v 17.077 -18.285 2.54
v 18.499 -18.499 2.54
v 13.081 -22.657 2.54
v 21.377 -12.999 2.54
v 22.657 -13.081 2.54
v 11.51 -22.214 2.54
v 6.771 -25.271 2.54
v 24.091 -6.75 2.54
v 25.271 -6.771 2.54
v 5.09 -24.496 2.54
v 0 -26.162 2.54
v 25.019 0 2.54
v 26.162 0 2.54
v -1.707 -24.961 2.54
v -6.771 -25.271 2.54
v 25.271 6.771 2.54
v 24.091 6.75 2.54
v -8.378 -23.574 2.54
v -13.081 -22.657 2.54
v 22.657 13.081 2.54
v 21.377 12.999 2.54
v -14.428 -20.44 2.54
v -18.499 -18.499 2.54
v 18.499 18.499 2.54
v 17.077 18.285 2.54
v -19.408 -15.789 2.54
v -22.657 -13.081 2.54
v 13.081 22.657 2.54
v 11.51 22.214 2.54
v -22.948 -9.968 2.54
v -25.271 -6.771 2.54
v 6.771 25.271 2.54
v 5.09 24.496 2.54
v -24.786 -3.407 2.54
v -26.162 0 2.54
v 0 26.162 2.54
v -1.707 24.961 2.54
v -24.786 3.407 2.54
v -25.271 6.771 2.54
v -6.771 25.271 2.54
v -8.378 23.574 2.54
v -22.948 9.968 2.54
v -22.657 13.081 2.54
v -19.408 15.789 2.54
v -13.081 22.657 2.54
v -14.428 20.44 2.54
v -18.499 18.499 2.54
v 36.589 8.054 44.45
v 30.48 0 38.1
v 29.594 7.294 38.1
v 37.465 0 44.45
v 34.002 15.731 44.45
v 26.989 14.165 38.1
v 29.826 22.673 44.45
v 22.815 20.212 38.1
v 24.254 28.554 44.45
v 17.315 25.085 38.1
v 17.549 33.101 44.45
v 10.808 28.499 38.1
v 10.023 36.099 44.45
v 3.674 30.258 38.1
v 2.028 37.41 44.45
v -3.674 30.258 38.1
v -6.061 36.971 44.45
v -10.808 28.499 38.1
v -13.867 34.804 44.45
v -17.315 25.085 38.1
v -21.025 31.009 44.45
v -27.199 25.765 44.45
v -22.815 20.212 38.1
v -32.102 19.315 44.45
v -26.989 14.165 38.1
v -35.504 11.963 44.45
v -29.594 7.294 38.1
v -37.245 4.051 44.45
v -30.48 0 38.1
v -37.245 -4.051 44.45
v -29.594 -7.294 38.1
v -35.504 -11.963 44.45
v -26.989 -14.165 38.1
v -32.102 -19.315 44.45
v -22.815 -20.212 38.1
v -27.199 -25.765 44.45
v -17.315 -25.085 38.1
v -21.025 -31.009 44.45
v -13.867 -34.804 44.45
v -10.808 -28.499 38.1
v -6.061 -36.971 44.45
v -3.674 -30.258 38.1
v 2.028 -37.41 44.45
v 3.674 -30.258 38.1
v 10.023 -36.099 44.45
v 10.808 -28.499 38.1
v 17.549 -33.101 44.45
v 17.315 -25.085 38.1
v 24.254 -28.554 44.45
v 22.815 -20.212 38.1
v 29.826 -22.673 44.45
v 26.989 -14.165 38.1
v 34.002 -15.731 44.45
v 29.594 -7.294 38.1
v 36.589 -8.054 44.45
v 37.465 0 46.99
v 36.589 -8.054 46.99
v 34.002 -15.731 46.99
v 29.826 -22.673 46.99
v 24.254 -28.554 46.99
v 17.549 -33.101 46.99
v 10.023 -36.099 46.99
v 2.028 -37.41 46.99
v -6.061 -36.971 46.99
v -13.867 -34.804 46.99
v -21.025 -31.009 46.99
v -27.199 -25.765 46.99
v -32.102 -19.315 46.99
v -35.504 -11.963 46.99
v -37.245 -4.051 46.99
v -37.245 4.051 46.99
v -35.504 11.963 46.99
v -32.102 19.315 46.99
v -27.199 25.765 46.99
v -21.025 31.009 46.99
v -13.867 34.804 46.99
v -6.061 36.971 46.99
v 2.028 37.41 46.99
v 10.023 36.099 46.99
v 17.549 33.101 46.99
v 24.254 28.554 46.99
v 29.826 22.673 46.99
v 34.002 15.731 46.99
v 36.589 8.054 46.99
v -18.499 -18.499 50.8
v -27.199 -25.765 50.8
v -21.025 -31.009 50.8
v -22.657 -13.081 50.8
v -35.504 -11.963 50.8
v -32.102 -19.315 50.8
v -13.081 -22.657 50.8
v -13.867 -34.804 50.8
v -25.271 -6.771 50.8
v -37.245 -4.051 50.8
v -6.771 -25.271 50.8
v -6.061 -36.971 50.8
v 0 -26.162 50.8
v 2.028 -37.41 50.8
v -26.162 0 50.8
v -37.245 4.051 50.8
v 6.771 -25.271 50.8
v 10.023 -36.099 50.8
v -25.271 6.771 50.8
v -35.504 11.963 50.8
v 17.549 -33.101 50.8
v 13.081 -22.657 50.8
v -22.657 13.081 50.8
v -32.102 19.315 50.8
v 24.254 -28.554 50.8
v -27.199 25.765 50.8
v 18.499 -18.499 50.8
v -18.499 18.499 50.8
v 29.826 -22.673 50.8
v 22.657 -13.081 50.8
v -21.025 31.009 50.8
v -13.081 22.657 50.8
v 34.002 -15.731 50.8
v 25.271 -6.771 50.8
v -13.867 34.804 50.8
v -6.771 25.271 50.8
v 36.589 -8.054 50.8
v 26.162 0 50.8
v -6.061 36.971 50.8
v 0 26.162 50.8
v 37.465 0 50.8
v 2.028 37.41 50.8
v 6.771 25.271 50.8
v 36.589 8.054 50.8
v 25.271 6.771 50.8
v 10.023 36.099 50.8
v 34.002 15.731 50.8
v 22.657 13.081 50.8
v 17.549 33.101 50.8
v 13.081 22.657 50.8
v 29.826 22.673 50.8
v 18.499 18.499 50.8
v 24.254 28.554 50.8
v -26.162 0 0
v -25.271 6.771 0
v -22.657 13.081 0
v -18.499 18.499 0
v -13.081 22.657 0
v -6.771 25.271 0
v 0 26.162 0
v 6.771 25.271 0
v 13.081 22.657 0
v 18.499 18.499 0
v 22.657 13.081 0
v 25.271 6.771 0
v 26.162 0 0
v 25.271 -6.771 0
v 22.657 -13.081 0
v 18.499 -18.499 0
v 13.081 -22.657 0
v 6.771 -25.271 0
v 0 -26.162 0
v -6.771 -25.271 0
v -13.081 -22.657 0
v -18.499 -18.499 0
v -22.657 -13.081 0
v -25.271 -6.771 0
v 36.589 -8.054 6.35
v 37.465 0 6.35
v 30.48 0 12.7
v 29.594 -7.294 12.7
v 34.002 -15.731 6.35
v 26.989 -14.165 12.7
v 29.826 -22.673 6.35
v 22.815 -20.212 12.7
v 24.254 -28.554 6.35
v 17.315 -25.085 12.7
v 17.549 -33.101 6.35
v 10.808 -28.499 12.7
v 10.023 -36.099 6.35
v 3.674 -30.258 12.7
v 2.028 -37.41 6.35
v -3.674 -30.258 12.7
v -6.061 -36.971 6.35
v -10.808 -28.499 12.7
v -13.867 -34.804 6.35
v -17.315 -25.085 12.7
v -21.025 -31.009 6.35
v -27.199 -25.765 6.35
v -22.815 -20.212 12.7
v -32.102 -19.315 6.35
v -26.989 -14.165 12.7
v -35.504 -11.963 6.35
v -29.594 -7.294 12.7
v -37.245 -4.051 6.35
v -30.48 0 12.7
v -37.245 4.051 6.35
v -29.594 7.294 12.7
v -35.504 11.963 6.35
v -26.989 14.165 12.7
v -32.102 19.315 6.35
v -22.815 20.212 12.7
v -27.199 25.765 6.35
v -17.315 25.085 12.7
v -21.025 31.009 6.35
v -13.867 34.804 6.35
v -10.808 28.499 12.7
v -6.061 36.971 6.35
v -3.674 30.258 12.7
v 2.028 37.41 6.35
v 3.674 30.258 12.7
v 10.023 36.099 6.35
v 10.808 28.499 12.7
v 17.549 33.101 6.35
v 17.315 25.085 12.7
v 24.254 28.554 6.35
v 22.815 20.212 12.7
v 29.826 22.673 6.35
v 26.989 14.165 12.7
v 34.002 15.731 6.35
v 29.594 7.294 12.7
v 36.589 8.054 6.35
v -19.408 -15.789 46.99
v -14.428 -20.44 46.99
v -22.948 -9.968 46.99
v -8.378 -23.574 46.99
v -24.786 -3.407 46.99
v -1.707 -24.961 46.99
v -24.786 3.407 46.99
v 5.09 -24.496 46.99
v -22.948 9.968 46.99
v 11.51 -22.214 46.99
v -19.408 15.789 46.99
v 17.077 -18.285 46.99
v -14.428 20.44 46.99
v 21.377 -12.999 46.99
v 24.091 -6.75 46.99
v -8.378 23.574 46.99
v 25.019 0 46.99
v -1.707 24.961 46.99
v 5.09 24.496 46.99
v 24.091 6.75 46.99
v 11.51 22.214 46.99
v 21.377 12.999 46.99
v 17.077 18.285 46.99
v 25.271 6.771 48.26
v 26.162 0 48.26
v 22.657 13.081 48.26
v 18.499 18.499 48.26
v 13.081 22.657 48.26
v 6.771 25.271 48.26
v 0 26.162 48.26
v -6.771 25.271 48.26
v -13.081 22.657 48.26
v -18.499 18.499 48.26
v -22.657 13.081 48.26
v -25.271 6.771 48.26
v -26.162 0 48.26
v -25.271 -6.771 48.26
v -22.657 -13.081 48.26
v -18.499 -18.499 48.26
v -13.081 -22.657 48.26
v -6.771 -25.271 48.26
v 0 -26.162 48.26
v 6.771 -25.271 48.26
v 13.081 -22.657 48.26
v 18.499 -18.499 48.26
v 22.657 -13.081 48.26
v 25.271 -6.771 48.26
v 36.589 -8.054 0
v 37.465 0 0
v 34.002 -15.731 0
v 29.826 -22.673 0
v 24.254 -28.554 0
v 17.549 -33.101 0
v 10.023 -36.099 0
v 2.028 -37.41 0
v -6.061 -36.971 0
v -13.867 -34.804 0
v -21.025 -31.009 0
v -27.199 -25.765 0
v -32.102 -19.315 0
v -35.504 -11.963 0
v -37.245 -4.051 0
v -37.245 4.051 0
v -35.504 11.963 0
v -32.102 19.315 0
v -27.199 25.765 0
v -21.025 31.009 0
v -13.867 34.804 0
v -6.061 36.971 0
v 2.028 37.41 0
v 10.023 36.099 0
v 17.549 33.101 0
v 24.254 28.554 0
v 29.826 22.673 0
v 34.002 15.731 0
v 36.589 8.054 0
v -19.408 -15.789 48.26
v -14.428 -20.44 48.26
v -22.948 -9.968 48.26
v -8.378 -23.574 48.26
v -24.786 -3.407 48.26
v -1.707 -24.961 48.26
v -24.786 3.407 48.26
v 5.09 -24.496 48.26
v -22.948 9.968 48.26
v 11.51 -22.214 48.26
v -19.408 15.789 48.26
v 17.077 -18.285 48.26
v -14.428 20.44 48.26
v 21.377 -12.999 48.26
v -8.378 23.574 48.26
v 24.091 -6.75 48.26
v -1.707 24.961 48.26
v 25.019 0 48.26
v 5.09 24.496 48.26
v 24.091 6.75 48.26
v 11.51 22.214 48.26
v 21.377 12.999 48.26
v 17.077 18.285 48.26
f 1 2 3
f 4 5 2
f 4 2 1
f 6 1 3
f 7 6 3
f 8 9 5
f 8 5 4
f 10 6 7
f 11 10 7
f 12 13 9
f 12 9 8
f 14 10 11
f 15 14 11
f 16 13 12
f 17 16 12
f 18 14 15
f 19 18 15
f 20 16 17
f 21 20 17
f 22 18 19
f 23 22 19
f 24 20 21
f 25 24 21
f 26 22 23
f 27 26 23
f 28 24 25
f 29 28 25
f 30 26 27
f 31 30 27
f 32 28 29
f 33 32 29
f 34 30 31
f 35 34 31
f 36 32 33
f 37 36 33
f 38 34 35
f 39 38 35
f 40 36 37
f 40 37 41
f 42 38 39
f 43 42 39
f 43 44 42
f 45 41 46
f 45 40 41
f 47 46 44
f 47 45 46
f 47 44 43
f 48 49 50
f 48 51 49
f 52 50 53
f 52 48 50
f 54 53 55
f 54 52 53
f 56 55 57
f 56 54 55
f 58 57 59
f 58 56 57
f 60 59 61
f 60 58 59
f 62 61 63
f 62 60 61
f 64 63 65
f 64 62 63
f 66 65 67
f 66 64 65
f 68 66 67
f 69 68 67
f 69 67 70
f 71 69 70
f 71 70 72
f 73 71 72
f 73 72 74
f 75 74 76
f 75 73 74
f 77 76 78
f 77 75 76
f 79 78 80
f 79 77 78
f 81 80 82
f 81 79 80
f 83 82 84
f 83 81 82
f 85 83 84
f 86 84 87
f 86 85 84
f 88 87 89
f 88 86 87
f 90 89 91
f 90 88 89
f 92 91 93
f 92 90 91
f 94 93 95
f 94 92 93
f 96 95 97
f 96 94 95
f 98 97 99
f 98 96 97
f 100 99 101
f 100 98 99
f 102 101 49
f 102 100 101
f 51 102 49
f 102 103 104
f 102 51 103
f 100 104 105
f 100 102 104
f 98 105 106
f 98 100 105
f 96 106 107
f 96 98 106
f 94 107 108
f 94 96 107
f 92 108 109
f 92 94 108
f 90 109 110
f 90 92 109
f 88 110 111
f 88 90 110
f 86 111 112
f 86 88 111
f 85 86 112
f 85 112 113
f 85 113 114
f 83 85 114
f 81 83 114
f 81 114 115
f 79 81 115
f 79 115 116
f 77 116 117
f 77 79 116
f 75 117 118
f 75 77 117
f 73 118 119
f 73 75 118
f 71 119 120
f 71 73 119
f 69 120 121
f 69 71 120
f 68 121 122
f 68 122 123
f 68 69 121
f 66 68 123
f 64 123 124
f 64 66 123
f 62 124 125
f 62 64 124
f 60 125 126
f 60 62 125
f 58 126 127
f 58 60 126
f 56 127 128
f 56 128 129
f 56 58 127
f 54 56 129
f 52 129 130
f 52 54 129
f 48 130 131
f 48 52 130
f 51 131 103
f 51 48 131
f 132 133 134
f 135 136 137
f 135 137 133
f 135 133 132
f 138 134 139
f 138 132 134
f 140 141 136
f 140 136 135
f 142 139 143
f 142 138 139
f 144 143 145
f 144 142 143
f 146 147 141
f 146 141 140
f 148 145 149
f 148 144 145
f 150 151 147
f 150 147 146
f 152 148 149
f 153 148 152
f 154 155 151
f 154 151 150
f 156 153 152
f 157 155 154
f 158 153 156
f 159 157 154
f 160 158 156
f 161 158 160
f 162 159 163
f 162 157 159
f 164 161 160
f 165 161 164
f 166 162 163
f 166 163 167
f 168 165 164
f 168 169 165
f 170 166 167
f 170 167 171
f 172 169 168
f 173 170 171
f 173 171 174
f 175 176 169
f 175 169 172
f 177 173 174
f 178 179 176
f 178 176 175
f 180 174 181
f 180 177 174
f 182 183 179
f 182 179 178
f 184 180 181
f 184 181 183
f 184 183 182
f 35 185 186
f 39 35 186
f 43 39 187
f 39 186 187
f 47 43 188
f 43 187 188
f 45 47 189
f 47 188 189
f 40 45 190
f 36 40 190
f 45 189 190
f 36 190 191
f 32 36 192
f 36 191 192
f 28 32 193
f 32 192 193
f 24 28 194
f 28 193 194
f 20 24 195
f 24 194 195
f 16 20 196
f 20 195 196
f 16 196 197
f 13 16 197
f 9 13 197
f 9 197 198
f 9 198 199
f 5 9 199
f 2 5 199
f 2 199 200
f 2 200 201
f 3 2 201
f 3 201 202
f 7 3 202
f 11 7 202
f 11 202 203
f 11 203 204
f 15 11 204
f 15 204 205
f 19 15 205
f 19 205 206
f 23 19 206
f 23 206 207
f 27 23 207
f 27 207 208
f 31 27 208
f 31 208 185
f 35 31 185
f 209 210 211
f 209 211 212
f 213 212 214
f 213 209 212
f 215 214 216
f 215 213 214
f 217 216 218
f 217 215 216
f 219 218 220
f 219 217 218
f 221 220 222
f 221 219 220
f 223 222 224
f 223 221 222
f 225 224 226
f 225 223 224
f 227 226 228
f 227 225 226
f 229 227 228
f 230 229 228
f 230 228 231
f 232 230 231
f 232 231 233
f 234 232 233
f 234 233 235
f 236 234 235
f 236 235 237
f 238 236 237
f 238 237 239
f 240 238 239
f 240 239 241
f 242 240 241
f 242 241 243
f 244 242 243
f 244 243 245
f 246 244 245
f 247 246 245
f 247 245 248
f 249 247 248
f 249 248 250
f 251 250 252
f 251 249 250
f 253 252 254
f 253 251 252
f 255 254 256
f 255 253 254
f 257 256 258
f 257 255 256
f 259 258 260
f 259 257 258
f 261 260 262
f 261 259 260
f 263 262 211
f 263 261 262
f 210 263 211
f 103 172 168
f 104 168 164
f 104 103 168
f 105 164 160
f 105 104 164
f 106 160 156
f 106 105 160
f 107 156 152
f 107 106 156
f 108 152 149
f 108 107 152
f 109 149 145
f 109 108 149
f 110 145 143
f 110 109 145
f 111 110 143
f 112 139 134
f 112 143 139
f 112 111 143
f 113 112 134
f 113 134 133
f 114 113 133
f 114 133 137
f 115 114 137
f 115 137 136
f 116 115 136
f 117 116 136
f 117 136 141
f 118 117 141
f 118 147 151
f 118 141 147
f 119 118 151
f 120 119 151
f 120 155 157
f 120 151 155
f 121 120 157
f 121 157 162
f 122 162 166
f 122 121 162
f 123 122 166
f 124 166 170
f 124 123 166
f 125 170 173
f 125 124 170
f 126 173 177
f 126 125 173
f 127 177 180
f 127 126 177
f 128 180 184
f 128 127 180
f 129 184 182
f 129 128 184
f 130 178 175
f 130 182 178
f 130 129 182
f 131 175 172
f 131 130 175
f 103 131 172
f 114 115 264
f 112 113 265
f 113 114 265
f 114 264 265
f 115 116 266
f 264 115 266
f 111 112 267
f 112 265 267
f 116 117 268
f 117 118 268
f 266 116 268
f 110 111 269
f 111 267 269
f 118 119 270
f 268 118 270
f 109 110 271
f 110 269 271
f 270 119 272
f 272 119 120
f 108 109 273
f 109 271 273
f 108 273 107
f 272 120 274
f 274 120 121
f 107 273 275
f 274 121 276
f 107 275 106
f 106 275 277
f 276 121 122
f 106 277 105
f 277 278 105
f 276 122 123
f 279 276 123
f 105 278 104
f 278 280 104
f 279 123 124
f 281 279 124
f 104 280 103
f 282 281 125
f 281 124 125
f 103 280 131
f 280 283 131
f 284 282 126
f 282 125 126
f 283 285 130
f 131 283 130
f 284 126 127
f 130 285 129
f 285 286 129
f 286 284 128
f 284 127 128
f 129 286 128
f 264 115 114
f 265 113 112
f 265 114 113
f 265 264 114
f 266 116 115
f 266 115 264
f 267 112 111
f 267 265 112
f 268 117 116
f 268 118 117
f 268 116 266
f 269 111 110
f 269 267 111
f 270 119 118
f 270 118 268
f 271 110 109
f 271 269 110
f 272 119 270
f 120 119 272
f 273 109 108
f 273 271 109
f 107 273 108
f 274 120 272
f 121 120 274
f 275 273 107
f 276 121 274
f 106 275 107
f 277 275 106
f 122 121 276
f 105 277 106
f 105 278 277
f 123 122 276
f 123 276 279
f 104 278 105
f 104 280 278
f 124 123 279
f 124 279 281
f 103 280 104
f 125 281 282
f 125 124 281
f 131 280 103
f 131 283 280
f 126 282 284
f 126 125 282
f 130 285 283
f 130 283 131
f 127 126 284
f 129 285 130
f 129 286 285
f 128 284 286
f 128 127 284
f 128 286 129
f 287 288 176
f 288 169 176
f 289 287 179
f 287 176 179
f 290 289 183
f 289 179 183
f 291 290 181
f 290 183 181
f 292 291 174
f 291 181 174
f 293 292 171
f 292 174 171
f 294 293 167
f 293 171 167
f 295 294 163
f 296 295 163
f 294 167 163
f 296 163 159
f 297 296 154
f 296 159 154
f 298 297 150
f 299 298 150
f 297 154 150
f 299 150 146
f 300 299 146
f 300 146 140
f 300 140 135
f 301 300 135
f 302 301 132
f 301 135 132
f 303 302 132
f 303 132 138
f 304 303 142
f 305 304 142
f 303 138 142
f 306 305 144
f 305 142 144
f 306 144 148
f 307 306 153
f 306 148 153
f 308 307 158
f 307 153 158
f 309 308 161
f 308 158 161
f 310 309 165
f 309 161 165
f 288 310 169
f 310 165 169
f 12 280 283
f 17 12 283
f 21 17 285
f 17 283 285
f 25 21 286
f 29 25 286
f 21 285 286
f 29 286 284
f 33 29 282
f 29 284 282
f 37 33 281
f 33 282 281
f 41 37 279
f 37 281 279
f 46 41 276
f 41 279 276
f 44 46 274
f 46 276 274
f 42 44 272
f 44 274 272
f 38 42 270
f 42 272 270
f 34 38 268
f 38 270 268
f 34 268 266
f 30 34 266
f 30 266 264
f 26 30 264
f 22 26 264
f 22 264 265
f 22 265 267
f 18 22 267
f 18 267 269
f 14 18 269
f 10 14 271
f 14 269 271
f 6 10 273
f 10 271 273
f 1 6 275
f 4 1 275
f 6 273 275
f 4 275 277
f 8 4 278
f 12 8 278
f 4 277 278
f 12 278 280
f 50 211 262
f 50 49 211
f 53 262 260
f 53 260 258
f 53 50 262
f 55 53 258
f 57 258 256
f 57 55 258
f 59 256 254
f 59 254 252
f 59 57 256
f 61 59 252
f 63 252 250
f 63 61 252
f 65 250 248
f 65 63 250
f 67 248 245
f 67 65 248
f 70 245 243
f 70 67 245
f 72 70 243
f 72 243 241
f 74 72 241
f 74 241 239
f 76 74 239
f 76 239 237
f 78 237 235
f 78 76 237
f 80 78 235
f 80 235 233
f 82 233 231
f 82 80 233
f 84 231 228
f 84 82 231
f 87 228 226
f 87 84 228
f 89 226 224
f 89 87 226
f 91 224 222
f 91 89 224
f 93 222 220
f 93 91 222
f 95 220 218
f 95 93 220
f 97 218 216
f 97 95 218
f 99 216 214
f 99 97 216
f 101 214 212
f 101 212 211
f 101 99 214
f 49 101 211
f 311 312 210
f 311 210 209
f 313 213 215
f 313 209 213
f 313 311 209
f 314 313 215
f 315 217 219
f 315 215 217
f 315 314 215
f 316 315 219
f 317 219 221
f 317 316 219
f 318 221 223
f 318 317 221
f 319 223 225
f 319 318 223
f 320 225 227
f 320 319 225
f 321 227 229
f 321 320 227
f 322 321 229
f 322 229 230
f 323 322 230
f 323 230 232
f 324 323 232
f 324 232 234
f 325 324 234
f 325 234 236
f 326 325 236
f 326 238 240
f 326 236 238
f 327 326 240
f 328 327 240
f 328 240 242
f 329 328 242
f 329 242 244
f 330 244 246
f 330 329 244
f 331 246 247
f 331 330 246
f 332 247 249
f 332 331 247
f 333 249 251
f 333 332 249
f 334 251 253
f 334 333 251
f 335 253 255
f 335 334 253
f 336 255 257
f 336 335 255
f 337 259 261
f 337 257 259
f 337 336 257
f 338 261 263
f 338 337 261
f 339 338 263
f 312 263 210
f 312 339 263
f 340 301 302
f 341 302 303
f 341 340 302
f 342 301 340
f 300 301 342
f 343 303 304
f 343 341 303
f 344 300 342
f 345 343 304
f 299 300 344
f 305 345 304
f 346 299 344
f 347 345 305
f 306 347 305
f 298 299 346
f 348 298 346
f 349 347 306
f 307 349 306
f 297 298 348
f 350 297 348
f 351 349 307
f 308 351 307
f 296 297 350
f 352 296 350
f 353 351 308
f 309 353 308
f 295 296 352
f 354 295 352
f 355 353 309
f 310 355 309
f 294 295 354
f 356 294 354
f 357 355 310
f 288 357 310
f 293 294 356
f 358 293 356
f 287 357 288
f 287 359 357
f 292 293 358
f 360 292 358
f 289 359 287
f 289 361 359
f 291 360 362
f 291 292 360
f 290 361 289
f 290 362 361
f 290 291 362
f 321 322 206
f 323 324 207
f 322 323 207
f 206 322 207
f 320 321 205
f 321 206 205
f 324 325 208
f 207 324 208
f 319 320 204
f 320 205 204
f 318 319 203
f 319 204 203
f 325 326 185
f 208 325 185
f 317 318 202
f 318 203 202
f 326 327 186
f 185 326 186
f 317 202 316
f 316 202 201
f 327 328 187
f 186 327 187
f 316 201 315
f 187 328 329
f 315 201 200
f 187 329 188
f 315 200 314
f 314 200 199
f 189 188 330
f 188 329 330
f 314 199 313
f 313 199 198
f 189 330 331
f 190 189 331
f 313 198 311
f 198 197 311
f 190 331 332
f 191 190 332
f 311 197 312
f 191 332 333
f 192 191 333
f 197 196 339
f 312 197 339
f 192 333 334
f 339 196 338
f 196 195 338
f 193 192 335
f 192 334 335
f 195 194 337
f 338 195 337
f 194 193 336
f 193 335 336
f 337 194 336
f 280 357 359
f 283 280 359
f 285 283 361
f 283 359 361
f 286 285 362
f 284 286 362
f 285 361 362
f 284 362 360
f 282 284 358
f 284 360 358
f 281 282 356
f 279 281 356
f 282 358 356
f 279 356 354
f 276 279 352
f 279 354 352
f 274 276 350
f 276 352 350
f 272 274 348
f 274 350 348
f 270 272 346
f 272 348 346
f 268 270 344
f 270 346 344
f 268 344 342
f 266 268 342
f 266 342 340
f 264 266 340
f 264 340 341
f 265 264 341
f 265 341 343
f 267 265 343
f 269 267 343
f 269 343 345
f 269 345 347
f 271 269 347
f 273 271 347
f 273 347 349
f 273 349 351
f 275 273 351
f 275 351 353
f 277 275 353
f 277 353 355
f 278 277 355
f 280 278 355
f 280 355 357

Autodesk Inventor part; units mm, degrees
ref_plane "YZ Plane" through (0, 0, 0) normal (1, 0, 0) x (0, 1, 0)
ref_plane "XZ Plane" through (0, 0, 0) normal (0, 1, 0) x (-1, 0, 0)
sketch "Sketch1" plane through (0, 0, 0) normal (0, 0, 1) x (1, 0, 0)
  circle A0 centre (0, 0) radius 37.465
  dimension "d0" = 74.93
extrude "Extrusion1" add sketch "Sketch1" along normal blind 50.8
sketch "Sketch3" plane through (0, 0, 50.8) normal (0, 0, 1) x (1, 0, 0)
  circle A0 centre (0, 0) radius 26.162
  dimension "d6" = 52.324
extrude "Extrusion3" cut sketch "Sketch3" against normal blind 2.54
sketch "Sketch4" plane through (0, 0, 0) normal (0, 0, -1) x (-1, 0, 0)
  circle A0 centre (0, 0) radius 26.162
  dimension "d9" = 52.324
extrude "Extrusion4" cut sketch "Sketch4" against normal blind 2.54
ref_plane "Work Plane1" through (0, 0, 25.4) normal (0, 0, 1) x (1, 0, 0)
sketch "Sketch5" plane through (0, 0, 25.4) normal (0, 0, 1) x (1, 0, 0)
  circle A0 centre (0, 0) radius 30.48
  circle A1 centre (0, 0) radius 37.465
  dimension "d13" = 60.96
extrude "Extrusion5" cut sketch "Sketch5" along normal mid plane 38.1
ref_plane "Work Plane2" through (0, 0, 38.1) normal (0, 0, 1) x (1, 0, 0)
sketch "Sketch6" plane through (0, 0, 38.1) normal (0, 0, 1) x (1, 0, 0)
  circle A0 centre (0, 0) radius 30.48
  dimension "d17" = 60.96
loft "Loft1" add profiles "Sketch6" section 1 edges at (-37.465, 0, 44.45)
ref_plane "Work Plane3" through (0, 0, 12.7) normal (0, 0, 1) x (1, 0, 0)
sketch "Sketch7" plane through (0, 0, 12.7) normal (0, 0, 1) x (1, 0, 0)
  circle A0 centre (0, 0) radius 30.48
  dimension "d31" = 60.96
loft "Loft3" add profiles "Sketch7" section 1 edges at (-37.465, 0, 6.35)
sketch "Sketch2" plane through (0, 0, 50.8) normal (0, 0, 1) x (1, 0, 0)
  circle A0 centre (0, 0) radius 25.019
  dimension "d3" = 50.038
extrude "Extrusion2" cut sketch "Sketch2" against normal blind 50.8
ref_plane "Work Plane4" through (0, 0, 46.99) normal (0, 0, 1) x (1, 0, 0)
split body "Split2" result two bodies by plane through (0, 0, 46.99) normal (0, 0, 1) first body at (33.0032, 2.7789, 47.49)
properties part number "KF50tube_v1"
